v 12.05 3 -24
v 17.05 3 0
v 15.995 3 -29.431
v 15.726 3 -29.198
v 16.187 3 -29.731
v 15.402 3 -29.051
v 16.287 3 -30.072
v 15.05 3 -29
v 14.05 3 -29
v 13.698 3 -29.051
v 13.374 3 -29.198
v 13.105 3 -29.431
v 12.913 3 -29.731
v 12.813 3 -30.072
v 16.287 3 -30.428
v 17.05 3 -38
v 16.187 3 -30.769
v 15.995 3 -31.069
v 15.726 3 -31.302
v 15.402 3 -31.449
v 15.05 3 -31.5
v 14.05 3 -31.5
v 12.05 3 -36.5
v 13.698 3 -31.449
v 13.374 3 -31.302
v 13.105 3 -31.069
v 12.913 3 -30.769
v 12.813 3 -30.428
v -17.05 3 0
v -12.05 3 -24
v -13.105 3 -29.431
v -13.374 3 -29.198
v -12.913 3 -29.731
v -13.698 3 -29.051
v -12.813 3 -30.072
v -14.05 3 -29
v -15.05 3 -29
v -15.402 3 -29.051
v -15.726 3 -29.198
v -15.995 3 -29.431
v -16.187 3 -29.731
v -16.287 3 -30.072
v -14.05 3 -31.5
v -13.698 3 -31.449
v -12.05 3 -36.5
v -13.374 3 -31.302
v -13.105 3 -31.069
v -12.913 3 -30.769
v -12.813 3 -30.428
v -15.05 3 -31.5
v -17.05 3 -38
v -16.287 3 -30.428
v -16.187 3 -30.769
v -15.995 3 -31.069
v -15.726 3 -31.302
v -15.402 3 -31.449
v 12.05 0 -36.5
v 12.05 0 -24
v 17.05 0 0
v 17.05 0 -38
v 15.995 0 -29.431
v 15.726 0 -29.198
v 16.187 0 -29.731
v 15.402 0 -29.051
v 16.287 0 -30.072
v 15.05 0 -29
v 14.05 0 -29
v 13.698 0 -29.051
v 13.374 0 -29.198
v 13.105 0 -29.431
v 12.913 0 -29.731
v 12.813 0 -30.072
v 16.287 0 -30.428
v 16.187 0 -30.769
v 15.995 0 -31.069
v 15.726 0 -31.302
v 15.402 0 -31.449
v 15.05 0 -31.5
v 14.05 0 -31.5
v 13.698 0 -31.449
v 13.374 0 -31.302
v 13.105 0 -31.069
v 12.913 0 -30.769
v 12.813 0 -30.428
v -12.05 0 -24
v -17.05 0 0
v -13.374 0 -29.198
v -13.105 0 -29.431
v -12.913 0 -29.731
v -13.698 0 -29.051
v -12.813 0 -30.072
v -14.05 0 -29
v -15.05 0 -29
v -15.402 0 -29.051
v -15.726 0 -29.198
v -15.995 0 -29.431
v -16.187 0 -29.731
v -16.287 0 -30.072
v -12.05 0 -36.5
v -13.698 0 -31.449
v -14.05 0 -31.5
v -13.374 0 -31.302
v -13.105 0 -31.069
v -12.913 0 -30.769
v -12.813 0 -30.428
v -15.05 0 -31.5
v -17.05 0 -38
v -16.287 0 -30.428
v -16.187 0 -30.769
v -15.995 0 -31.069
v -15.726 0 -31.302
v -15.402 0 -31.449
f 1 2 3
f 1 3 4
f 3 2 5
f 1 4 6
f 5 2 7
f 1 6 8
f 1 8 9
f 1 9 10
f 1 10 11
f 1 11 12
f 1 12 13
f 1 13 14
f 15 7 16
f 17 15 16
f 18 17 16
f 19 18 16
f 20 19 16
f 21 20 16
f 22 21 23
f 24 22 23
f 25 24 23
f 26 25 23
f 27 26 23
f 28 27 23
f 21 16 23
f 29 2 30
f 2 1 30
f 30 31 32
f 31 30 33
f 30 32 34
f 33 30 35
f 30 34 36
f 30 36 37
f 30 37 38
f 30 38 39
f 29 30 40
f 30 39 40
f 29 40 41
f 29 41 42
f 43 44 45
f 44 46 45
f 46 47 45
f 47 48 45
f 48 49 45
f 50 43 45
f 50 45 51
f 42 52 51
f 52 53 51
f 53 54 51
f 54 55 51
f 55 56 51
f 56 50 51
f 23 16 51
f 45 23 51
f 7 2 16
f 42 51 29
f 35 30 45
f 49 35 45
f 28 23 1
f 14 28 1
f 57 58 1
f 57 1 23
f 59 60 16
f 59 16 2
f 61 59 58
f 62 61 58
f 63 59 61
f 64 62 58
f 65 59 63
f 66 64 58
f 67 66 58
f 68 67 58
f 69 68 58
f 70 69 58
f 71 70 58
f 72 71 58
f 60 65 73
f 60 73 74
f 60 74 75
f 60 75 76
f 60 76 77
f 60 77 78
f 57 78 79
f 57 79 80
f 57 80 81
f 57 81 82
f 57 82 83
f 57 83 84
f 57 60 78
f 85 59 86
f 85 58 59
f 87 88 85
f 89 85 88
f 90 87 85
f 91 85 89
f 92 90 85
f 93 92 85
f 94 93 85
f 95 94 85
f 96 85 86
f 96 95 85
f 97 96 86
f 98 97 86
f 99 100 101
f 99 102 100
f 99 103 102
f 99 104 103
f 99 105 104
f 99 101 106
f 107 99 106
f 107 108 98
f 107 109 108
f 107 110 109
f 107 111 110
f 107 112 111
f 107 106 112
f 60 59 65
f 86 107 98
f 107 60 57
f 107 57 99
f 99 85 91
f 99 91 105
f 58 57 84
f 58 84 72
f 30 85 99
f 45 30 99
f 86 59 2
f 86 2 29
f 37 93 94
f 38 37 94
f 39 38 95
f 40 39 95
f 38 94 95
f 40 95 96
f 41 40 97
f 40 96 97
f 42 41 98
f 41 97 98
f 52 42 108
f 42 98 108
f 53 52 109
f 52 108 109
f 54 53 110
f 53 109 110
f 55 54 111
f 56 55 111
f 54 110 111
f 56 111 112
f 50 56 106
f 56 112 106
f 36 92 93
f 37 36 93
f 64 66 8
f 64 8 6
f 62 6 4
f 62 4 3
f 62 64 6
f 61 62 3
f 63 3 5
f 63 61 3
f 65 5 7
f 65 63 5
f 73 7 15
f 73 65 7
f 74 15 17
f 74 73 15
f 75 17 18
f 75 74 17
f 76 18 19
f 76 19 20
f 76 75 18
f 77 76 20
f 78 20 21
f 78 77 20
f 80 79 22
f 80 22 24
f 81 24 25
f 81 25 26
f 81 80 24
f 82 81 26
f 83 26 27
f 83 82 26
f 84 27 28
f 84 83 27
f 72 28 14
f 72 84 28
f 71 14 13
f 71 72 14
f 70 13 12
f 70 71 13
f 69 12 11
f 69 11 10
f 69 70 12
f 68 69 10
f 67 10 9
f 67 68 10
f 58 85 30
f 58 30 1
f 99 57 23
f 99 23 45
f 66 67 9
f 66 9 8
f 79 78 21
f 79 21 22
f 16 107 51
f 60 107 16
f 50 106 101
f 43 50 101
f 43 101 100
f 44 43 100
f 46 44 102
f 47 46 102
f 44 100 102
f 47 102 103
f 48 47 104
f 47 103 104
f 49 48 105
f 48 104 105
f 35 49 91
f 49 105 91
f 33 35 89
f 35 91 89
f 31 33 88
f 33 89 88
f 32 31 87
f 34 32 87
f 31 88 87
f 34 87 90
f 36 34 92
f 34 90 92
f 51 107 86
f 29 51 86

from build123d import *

# Parameters (mm, degrees)
BOSS_EXTRU_1_DEPTH = 3


with BuildPart() as part:
    # Esquisse1 → Boss.-Extru.1 (new body)
    with BuildSketch(Plane(origin=(0, 0, 0), x_dir=(1, 0, 0), z_dir=(0, 1, 0))):
        Polygon((-12.05, 36.5), (0, 36.5), (0, 38), (-17.05, 38), (-17.05, 0), (0, 0), (0, 24), (-12.05, 24), align=None)
        with BuildLine():
            ThreePointArc((-15.05, 29), (-16.3, 30.25), (-15.05, 31.5))
            Line((-15.05, 31.5), (-14.05, 31.5))
            ThreePointArc((-14.05, 31.5), (-12.8, 30.25), (-14.05, 29))
            Line((-14.05, 29), (-15.05, 29))
        make_face(mode=Mode.SUBTRACT)
    boss_extru_1 = extrude(amount=BOSS_EXTRU_1_DEPTH)

    # Symétrie1: Boss.-Extru.1 across plane
    add(boss_extru_1.mirror(Plane(origin=(0, 3, 0), x_dir=(0, 0, 1), z_dir=(-1, 0, 0))))


solid = part.part
